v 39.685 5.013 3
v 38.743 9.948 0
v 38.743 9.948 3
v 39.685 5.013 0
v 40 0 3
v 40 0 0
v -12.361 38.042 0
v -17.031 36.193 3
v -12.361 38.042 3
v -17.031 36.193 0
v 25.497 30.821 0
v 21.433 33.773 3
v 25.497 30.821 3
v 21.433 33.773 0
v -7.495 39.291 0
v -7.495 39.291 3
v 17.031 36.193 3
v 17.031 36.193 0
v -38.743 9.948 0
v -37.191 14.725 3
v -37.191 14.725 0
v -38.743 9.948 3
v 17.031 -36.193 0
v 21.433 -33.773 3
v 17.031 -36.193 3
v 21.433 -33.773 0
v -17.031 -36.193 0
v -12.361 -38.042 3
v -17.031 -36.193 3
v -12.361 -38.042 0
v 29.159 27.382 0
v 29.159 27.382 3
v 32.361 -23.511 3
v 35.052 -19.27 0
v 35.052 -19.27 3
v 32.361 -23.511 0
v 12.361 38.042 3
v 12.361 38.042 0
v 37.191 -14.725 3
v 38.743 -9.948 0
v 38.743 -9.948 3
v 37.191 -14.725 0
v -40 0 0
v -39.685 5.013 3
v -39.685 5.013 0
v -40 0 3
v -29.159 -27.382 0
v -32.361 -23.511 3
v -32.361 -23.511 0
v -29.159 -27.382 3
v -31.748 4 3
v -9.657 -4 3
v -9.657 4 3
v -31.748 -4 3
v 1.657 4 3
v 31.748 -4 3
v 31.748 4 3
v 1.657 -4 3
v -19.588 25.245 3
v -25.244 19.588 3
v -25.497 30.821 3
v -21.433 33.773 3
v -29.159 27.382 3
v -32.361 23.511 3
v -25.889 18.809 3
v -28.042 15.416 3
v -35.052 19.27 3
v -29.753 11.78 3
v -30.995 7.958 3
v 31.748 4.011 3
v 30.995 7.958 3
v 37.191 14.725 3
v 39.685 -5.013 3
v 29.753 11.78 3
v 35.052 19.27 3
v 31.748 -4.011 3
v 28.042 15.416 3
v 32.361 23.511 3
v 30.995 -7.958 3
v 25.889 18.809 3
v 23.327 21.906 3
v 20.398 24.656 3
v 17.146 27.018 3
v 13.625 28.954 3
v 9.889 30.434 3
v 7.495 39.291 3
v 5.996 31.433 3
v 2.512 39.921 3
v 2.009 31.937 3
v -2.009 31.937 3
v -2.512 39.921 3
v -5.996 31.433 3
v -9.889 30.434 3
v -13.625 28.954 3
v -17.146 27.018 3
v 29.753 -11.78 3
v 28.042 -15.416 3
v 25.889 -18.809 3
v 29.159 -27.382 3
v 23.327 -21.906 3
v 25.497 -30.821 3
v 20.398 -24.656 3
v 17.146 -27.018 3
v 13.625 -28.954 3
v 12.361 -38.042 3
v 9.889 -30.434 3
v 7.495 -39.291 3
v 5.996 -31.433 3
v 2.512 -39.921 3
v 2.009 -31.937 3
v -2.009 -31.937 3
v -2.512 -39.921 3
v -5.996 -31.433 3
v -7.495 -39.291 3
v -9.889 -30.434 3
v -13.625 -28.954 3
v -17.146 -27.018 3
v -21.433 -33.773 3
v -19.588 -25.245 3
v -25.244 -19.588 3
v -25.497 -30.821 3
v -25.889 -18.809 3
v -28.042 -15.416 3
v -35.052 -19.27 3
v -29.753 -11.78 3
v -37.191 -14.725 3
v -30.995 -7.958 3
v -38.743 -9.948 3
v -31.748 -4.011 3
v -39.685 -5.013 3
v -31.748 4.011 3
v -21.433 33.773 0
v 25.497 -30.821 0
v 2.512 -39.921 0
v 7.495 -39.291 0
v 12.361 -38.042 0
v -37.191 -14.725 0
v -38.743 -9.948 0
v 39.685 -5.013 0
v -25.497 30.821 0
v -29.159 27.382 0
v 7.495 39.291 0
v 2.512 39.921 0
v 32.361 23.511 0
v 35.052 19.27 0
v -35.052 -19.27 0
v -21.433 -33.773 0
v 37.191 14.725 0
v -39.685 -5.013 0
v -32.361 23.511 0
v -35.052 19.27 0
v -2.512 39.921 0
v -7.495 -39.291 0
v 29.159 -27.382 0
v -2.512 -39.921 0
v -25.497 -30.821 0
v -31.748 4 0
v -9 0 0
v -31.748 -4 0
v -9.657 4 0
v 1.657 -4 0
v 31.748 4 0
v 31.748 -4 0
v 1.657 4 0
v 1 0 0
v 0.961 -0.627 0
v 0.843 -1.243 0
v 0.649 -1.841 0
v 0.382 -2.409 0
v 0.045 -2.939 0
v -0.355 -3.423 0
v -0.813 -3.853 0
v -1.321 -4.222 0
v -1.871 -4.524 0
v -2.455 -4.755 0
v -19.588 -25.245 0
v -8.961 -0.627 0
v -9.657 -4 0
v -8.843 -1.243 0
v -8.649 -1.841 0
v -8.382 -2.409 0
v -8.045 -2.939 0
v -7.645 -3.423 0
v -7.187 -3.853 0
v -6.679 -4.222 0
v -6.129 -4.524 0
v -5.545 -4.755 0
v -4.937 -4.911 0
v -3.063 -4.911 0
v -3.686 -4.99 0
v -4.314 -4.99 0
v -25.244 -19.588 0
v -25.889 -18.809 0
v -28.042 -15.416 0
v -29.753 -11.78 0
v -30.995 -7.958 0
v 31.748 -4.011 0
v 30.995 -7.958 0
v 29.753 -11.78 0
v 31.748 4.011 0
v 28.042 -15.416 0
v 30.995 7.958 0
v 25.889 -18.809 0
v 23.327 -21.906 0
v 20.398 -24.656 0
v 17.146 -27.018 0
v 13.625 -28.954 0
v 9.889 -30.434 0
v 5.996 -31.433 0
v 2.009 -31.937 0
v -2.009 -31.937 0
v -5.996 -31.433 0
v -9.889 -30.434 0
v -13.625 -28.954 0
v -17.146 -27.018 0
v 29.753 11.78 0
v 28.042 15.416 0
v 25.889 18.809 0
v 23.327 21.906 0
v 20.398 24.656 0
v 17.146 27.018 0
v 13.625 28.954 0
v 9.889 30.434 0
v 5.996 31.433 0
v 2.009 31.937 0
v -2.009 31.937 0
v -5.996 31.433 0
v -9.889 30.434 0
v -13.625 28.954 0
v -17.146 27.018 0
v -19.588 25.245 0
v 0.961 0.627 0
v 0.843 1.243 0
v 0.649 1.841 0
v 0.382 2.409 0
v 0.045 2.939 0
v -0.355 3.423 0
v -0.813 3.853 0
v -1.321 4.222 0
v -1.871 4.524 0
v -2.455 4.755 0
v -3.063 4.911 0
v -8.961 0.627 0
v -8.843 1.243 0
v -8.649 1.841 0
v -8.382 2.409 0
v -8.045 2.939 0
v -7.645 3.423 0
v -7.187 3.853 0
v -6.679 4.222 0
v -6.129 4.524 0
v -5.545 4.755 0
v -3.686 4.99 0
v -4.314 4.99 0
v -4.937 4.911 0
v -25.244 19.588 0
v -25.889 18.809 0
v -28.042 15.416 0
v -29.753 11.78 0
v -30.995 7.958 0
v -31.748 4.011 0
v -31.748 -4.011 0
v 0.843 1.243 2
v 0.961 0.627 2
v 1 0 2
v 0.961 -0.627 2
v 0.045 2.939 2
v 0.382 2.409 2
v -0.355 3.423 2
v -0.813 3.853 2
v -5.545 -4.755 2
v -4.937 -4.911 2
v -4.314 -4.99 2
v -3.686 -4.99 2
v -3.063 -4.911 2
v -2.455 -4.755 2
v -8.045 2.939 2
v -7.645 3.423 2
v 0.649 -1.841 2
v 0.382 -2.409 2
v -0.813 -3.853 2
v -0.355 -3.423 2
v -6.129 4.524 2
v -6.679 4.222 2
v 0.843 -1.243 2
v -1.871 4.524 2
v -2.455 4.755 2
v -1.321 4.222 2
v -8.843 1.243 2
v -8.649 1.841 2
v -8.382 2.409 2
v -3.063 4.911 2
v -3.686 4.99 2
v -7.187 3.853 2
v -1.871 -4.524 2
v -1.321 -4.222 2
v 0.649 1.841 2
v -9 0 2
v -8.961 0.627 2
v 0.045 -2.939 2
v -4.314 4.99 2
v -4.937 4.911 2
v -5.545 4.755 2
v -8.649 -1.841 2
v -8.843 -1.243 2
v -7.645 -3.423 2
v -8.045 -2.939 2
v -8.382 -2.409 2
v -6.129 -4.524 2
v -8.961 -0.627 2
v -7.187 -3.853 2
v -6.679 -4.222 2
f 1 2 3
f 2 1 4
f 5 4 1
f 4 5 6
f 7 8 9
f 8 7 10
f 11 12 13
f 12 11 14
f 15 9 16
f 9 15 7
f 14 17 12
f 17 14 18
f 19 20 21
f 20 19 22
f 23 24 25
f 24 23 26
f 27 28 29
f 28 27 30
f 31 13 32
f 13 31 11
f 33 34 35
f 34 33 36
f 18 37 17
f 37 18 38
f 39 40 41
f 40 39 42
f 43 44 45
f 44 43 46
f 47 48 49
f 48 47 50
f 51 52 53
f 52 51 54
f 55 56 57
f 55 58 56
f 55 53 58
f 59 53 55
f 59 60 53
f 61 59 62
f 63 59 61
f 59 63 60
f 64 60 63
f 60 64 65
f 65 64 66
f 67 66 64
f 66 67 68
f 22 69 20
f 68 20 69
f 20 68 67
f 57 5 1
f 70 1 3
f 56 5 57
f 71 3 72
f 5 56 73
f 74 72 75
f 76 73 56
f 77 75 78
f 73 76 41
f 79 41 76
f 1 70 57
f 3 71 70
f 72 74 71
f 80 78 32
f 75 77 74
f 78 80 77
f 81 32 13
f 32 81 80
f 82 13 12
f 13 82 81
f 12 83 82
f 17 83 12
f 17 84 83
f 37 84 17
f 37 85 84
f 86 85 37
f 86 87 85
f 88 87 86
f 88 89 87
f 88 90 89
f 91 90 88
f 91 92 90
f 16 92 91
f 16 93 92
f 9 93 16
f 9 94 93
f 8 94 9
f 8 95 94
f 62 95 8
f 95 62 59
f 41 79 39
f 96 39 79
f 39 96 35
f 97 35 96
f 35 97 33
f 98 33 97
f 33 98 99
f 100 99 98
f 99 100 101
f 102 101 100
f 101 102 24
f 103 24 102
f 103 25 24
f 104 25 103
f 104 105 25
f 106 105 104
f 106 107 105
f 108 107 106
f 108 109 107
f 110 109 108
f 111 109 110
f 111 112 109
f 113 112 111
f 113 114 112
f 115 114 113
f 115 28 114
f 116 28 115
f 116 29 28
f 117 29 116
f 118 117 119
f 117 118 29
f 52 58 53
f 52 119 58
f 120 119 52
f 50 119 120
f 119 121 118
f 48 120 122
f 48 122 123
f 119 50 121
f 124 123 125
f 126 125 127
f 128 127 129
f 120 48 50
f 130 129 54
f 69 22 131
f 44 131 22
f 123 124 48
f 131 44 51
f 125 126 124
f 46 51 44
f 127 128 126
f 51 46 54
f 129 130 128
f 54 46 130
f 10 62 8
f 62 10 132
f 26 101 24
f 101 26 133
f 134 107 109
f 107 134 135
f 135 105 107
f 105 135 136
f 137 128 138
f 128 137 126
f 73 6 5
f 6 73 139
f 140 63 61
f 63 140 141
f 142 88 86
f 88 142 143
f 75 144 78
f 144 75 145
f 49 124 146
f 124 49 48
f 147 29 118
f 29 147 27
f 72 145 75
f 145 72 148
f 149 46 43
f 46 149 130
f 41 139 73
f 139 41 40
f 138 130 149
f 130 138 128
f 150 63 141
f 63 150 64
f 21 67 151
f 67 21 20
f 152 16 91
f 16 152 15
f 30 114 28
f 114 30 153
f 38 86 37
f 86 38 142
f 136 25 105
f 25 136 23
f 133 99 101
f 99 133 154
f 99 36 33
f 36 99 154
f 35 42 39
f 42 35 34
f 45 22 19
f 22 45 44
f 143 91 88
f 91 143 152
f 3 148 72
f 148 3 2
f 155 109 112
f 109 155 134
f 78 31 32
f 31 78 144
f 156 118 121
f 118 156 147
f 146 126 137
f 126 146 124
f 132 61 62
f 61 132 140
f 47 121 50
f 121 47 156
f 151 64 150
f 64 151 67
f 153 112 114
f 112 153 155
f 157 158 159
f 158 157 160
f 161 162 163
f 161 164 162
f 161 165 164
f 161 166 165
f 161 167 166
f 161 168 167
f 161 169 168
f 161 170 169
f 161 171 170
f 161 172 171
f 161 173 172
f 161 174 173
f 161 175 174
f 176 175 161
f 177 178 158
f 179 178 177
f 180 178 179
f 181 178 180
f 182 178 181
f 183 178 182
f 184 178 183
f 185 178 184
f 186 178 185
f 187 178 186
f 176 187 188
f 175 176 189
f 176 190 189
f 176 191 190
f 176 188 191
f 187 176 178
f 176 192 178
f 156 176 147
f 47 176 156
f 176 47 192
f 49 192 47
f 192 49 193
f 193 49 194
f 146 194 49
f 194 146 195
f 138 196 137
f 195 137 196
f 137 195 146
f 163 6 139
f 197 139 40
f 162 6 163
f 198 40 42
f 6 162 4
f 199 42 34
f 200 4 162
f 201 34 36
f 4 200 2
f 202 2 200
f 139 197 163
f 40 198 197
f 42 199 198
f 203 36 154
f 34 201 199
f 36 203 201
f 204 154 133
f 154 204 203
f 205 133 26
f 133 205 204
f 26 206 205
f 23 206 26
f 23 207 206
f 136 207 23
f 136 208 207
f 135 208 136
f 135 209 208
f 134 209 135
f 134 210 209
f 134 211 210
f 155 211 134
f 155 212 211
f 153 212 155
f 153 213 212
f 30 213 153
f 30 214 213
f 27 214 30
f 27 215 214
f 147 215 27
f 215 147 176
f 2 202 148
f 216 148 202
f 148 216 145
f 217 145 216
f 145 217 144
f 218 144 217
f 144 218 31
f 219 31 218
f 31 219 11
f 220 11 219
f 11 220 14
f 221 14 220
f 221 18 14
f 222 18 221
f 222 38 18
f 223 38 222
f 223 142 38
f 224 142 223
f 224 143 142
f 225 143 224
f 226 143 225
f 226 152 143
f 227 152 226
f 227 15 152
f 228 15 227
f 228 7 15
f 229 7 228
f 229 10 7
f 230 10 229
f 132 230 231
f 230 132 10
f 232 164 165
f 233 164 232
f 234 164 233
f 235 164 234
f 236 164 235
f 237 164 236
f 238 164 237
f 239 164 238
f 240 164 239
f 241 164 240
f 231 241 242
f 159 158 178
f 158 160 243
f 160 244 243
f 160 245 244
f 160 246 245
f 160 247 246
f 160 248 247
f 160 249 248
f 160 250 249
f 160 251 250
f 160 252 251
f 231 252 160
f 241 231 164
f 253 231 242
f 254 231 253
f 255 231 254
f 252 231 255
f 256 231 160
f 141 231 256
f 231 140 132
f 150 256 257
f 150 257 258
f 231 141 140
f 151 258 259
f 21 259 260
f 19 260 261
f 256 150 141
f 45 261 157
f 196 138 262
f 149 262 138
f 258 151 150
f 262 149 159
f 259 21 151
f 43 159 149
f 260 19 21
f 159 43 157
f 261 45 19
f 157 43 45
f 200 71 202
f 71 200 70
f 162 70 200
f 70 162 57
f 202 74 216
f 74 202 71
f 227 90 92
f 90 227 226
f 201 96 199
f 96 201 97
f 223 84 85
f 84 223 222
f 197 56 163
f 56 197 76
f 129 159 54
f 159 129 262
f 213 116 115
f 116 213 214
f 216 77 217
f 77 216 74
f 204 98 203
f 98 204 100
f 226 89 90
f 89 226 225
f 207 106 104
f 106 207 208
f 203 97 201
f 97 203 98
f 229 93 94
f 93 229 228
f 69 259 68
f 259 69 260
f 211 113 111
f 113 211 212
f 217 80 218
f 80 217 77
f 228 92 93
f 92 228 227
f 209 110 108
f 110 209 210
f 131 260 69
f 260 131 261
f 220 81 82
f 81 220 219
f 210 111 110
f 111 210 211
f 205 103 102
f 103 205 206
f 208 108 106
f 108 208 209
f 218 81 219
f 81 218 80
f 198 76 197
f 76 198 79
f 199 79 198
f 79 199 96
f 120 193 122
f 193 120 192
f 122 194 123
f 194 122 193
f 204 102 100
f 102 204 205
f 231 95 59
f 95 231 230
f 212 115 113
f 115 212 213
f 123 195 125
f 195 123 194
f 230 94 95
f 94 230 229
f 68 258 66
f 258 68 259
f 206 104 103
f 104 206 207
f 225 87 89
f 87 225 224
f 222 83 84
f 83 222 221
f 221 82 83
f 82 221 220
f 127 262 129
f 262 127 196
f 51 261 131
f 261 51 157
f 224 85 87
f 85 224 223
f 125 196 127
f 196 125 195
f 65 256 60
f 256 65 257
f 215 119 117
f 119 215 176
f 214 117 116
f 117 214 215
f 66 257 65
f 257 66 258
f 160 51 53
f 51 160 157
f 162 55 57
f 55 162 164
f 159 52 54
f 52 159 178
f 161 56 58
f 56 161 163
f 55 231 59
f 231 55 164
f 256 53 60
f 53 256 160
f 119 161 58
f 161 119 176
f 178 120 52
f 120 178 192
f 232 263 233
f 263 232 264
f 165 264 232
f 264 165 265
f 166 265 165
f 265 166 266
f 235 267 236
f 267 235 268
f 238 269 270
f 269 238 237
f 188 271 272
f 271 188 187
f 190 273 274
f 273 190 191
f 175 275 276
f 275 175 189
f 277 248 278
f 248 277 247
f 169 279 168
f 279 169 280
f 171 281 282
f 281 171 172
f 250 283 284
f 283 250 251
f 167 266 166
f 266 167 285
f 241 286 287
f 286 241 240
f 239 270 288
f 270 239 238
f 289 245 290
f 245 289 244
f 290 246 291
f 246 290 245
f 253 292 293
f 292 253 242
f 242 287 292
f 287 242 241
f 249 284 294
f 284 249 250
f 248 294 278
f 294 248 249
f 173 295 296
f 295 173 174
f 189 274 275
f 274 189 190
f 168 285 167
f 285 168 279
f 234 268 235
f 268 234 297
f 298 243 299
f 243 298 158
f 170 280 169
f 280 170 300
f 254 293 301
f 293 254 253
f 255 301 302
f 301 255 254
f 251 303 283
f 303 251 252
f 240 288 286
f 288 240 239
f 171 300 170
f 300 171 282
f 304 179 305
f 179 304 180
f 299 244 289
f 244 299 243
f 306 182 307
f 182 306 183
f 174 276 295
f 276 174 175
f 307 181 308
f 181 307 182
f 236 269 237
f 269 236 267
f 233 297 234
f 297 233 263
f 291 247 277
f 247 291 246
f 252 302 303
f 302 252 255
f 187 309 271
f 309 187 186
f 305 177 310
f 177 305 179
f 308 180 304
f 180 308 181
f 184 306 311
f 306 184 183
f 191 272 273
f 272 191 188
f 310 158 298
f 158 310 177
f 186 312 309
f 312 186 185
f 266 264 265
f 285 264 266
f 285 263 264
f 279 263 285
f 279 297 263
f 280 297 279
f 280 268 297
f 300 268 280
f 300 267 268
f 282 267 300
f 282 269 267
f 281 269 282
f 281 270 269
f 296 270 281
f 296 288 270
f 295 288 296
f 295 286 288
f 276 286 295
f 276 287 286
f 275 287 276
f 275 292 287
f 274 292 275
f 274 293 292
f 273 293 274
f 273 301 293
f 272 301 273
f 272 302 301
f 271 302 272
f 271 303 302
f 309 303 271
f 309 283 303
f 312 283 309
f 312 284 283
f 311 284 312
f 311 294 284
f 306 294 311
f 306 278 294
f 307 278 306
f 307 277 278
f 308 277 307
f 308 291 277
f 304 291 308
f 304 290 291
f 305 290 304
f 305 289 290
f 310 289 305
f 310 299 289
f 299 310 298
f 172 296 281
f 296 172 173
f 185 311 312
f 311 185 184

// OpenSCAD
//Thickness/height of sign
height = 3;
//Diameter of sign
diameter = 80;

//width of inner and outer walls
wall_thickness = 8;

/*[Magnet]*/
//Diameter of hole for inserting magnet
magnet_diameter = 10;
//Depth of hole for magnet
magnet_thickness = 2;


/*[Extra-advanced]*/
inside_resolution = 50;

outside_resolution = 50;
//for aligning rotated bars to center of ring 
delta_stick_move = sqrt(pow((wall_thickness/2),2)/2);

// preview[view:south west, tilt:top diagonal]

//outside ring
difference(){
	translate([0,0,height/2])
	cylinder(h = height, r = diameter/2, $fn = outside_resolution, center = true);
	translate([0,0,height/2 - 1])
	cylinder(h = height + 3, r = (diameter - wall_thickness*2)/2, $fn = inside_resolution, center = true);
}

//make hole for magnet
difference(){
//union body
union(){

//middlestick
translate([-diameter/2 + wall_thickness/2, -wall_thickness/2, 0]) 
cube([diameter - wall_thickness, wall_thickness, height]);

//first sidestick

translate([delta_stick_move,delta_stick_move,0])
rotate([0,0,135]) 
cube([diameter/2 - wall_thickness/2, wall_thickness, height]);

//second sidestick
mirror([0,1,0]){

translate([delta_stick_move,delta_stick_move,0])
rotate([0,0,135])
cube([diameter/2 - wall_thickness/2, wall_thickness, height]);
}

} //end of union for body

//magnet hole
translate([-wall_thickness/2,0,-2])
cylinder(h = magnet_thickness+2, r = magnet_diameter/2, $fn = 50);
}
